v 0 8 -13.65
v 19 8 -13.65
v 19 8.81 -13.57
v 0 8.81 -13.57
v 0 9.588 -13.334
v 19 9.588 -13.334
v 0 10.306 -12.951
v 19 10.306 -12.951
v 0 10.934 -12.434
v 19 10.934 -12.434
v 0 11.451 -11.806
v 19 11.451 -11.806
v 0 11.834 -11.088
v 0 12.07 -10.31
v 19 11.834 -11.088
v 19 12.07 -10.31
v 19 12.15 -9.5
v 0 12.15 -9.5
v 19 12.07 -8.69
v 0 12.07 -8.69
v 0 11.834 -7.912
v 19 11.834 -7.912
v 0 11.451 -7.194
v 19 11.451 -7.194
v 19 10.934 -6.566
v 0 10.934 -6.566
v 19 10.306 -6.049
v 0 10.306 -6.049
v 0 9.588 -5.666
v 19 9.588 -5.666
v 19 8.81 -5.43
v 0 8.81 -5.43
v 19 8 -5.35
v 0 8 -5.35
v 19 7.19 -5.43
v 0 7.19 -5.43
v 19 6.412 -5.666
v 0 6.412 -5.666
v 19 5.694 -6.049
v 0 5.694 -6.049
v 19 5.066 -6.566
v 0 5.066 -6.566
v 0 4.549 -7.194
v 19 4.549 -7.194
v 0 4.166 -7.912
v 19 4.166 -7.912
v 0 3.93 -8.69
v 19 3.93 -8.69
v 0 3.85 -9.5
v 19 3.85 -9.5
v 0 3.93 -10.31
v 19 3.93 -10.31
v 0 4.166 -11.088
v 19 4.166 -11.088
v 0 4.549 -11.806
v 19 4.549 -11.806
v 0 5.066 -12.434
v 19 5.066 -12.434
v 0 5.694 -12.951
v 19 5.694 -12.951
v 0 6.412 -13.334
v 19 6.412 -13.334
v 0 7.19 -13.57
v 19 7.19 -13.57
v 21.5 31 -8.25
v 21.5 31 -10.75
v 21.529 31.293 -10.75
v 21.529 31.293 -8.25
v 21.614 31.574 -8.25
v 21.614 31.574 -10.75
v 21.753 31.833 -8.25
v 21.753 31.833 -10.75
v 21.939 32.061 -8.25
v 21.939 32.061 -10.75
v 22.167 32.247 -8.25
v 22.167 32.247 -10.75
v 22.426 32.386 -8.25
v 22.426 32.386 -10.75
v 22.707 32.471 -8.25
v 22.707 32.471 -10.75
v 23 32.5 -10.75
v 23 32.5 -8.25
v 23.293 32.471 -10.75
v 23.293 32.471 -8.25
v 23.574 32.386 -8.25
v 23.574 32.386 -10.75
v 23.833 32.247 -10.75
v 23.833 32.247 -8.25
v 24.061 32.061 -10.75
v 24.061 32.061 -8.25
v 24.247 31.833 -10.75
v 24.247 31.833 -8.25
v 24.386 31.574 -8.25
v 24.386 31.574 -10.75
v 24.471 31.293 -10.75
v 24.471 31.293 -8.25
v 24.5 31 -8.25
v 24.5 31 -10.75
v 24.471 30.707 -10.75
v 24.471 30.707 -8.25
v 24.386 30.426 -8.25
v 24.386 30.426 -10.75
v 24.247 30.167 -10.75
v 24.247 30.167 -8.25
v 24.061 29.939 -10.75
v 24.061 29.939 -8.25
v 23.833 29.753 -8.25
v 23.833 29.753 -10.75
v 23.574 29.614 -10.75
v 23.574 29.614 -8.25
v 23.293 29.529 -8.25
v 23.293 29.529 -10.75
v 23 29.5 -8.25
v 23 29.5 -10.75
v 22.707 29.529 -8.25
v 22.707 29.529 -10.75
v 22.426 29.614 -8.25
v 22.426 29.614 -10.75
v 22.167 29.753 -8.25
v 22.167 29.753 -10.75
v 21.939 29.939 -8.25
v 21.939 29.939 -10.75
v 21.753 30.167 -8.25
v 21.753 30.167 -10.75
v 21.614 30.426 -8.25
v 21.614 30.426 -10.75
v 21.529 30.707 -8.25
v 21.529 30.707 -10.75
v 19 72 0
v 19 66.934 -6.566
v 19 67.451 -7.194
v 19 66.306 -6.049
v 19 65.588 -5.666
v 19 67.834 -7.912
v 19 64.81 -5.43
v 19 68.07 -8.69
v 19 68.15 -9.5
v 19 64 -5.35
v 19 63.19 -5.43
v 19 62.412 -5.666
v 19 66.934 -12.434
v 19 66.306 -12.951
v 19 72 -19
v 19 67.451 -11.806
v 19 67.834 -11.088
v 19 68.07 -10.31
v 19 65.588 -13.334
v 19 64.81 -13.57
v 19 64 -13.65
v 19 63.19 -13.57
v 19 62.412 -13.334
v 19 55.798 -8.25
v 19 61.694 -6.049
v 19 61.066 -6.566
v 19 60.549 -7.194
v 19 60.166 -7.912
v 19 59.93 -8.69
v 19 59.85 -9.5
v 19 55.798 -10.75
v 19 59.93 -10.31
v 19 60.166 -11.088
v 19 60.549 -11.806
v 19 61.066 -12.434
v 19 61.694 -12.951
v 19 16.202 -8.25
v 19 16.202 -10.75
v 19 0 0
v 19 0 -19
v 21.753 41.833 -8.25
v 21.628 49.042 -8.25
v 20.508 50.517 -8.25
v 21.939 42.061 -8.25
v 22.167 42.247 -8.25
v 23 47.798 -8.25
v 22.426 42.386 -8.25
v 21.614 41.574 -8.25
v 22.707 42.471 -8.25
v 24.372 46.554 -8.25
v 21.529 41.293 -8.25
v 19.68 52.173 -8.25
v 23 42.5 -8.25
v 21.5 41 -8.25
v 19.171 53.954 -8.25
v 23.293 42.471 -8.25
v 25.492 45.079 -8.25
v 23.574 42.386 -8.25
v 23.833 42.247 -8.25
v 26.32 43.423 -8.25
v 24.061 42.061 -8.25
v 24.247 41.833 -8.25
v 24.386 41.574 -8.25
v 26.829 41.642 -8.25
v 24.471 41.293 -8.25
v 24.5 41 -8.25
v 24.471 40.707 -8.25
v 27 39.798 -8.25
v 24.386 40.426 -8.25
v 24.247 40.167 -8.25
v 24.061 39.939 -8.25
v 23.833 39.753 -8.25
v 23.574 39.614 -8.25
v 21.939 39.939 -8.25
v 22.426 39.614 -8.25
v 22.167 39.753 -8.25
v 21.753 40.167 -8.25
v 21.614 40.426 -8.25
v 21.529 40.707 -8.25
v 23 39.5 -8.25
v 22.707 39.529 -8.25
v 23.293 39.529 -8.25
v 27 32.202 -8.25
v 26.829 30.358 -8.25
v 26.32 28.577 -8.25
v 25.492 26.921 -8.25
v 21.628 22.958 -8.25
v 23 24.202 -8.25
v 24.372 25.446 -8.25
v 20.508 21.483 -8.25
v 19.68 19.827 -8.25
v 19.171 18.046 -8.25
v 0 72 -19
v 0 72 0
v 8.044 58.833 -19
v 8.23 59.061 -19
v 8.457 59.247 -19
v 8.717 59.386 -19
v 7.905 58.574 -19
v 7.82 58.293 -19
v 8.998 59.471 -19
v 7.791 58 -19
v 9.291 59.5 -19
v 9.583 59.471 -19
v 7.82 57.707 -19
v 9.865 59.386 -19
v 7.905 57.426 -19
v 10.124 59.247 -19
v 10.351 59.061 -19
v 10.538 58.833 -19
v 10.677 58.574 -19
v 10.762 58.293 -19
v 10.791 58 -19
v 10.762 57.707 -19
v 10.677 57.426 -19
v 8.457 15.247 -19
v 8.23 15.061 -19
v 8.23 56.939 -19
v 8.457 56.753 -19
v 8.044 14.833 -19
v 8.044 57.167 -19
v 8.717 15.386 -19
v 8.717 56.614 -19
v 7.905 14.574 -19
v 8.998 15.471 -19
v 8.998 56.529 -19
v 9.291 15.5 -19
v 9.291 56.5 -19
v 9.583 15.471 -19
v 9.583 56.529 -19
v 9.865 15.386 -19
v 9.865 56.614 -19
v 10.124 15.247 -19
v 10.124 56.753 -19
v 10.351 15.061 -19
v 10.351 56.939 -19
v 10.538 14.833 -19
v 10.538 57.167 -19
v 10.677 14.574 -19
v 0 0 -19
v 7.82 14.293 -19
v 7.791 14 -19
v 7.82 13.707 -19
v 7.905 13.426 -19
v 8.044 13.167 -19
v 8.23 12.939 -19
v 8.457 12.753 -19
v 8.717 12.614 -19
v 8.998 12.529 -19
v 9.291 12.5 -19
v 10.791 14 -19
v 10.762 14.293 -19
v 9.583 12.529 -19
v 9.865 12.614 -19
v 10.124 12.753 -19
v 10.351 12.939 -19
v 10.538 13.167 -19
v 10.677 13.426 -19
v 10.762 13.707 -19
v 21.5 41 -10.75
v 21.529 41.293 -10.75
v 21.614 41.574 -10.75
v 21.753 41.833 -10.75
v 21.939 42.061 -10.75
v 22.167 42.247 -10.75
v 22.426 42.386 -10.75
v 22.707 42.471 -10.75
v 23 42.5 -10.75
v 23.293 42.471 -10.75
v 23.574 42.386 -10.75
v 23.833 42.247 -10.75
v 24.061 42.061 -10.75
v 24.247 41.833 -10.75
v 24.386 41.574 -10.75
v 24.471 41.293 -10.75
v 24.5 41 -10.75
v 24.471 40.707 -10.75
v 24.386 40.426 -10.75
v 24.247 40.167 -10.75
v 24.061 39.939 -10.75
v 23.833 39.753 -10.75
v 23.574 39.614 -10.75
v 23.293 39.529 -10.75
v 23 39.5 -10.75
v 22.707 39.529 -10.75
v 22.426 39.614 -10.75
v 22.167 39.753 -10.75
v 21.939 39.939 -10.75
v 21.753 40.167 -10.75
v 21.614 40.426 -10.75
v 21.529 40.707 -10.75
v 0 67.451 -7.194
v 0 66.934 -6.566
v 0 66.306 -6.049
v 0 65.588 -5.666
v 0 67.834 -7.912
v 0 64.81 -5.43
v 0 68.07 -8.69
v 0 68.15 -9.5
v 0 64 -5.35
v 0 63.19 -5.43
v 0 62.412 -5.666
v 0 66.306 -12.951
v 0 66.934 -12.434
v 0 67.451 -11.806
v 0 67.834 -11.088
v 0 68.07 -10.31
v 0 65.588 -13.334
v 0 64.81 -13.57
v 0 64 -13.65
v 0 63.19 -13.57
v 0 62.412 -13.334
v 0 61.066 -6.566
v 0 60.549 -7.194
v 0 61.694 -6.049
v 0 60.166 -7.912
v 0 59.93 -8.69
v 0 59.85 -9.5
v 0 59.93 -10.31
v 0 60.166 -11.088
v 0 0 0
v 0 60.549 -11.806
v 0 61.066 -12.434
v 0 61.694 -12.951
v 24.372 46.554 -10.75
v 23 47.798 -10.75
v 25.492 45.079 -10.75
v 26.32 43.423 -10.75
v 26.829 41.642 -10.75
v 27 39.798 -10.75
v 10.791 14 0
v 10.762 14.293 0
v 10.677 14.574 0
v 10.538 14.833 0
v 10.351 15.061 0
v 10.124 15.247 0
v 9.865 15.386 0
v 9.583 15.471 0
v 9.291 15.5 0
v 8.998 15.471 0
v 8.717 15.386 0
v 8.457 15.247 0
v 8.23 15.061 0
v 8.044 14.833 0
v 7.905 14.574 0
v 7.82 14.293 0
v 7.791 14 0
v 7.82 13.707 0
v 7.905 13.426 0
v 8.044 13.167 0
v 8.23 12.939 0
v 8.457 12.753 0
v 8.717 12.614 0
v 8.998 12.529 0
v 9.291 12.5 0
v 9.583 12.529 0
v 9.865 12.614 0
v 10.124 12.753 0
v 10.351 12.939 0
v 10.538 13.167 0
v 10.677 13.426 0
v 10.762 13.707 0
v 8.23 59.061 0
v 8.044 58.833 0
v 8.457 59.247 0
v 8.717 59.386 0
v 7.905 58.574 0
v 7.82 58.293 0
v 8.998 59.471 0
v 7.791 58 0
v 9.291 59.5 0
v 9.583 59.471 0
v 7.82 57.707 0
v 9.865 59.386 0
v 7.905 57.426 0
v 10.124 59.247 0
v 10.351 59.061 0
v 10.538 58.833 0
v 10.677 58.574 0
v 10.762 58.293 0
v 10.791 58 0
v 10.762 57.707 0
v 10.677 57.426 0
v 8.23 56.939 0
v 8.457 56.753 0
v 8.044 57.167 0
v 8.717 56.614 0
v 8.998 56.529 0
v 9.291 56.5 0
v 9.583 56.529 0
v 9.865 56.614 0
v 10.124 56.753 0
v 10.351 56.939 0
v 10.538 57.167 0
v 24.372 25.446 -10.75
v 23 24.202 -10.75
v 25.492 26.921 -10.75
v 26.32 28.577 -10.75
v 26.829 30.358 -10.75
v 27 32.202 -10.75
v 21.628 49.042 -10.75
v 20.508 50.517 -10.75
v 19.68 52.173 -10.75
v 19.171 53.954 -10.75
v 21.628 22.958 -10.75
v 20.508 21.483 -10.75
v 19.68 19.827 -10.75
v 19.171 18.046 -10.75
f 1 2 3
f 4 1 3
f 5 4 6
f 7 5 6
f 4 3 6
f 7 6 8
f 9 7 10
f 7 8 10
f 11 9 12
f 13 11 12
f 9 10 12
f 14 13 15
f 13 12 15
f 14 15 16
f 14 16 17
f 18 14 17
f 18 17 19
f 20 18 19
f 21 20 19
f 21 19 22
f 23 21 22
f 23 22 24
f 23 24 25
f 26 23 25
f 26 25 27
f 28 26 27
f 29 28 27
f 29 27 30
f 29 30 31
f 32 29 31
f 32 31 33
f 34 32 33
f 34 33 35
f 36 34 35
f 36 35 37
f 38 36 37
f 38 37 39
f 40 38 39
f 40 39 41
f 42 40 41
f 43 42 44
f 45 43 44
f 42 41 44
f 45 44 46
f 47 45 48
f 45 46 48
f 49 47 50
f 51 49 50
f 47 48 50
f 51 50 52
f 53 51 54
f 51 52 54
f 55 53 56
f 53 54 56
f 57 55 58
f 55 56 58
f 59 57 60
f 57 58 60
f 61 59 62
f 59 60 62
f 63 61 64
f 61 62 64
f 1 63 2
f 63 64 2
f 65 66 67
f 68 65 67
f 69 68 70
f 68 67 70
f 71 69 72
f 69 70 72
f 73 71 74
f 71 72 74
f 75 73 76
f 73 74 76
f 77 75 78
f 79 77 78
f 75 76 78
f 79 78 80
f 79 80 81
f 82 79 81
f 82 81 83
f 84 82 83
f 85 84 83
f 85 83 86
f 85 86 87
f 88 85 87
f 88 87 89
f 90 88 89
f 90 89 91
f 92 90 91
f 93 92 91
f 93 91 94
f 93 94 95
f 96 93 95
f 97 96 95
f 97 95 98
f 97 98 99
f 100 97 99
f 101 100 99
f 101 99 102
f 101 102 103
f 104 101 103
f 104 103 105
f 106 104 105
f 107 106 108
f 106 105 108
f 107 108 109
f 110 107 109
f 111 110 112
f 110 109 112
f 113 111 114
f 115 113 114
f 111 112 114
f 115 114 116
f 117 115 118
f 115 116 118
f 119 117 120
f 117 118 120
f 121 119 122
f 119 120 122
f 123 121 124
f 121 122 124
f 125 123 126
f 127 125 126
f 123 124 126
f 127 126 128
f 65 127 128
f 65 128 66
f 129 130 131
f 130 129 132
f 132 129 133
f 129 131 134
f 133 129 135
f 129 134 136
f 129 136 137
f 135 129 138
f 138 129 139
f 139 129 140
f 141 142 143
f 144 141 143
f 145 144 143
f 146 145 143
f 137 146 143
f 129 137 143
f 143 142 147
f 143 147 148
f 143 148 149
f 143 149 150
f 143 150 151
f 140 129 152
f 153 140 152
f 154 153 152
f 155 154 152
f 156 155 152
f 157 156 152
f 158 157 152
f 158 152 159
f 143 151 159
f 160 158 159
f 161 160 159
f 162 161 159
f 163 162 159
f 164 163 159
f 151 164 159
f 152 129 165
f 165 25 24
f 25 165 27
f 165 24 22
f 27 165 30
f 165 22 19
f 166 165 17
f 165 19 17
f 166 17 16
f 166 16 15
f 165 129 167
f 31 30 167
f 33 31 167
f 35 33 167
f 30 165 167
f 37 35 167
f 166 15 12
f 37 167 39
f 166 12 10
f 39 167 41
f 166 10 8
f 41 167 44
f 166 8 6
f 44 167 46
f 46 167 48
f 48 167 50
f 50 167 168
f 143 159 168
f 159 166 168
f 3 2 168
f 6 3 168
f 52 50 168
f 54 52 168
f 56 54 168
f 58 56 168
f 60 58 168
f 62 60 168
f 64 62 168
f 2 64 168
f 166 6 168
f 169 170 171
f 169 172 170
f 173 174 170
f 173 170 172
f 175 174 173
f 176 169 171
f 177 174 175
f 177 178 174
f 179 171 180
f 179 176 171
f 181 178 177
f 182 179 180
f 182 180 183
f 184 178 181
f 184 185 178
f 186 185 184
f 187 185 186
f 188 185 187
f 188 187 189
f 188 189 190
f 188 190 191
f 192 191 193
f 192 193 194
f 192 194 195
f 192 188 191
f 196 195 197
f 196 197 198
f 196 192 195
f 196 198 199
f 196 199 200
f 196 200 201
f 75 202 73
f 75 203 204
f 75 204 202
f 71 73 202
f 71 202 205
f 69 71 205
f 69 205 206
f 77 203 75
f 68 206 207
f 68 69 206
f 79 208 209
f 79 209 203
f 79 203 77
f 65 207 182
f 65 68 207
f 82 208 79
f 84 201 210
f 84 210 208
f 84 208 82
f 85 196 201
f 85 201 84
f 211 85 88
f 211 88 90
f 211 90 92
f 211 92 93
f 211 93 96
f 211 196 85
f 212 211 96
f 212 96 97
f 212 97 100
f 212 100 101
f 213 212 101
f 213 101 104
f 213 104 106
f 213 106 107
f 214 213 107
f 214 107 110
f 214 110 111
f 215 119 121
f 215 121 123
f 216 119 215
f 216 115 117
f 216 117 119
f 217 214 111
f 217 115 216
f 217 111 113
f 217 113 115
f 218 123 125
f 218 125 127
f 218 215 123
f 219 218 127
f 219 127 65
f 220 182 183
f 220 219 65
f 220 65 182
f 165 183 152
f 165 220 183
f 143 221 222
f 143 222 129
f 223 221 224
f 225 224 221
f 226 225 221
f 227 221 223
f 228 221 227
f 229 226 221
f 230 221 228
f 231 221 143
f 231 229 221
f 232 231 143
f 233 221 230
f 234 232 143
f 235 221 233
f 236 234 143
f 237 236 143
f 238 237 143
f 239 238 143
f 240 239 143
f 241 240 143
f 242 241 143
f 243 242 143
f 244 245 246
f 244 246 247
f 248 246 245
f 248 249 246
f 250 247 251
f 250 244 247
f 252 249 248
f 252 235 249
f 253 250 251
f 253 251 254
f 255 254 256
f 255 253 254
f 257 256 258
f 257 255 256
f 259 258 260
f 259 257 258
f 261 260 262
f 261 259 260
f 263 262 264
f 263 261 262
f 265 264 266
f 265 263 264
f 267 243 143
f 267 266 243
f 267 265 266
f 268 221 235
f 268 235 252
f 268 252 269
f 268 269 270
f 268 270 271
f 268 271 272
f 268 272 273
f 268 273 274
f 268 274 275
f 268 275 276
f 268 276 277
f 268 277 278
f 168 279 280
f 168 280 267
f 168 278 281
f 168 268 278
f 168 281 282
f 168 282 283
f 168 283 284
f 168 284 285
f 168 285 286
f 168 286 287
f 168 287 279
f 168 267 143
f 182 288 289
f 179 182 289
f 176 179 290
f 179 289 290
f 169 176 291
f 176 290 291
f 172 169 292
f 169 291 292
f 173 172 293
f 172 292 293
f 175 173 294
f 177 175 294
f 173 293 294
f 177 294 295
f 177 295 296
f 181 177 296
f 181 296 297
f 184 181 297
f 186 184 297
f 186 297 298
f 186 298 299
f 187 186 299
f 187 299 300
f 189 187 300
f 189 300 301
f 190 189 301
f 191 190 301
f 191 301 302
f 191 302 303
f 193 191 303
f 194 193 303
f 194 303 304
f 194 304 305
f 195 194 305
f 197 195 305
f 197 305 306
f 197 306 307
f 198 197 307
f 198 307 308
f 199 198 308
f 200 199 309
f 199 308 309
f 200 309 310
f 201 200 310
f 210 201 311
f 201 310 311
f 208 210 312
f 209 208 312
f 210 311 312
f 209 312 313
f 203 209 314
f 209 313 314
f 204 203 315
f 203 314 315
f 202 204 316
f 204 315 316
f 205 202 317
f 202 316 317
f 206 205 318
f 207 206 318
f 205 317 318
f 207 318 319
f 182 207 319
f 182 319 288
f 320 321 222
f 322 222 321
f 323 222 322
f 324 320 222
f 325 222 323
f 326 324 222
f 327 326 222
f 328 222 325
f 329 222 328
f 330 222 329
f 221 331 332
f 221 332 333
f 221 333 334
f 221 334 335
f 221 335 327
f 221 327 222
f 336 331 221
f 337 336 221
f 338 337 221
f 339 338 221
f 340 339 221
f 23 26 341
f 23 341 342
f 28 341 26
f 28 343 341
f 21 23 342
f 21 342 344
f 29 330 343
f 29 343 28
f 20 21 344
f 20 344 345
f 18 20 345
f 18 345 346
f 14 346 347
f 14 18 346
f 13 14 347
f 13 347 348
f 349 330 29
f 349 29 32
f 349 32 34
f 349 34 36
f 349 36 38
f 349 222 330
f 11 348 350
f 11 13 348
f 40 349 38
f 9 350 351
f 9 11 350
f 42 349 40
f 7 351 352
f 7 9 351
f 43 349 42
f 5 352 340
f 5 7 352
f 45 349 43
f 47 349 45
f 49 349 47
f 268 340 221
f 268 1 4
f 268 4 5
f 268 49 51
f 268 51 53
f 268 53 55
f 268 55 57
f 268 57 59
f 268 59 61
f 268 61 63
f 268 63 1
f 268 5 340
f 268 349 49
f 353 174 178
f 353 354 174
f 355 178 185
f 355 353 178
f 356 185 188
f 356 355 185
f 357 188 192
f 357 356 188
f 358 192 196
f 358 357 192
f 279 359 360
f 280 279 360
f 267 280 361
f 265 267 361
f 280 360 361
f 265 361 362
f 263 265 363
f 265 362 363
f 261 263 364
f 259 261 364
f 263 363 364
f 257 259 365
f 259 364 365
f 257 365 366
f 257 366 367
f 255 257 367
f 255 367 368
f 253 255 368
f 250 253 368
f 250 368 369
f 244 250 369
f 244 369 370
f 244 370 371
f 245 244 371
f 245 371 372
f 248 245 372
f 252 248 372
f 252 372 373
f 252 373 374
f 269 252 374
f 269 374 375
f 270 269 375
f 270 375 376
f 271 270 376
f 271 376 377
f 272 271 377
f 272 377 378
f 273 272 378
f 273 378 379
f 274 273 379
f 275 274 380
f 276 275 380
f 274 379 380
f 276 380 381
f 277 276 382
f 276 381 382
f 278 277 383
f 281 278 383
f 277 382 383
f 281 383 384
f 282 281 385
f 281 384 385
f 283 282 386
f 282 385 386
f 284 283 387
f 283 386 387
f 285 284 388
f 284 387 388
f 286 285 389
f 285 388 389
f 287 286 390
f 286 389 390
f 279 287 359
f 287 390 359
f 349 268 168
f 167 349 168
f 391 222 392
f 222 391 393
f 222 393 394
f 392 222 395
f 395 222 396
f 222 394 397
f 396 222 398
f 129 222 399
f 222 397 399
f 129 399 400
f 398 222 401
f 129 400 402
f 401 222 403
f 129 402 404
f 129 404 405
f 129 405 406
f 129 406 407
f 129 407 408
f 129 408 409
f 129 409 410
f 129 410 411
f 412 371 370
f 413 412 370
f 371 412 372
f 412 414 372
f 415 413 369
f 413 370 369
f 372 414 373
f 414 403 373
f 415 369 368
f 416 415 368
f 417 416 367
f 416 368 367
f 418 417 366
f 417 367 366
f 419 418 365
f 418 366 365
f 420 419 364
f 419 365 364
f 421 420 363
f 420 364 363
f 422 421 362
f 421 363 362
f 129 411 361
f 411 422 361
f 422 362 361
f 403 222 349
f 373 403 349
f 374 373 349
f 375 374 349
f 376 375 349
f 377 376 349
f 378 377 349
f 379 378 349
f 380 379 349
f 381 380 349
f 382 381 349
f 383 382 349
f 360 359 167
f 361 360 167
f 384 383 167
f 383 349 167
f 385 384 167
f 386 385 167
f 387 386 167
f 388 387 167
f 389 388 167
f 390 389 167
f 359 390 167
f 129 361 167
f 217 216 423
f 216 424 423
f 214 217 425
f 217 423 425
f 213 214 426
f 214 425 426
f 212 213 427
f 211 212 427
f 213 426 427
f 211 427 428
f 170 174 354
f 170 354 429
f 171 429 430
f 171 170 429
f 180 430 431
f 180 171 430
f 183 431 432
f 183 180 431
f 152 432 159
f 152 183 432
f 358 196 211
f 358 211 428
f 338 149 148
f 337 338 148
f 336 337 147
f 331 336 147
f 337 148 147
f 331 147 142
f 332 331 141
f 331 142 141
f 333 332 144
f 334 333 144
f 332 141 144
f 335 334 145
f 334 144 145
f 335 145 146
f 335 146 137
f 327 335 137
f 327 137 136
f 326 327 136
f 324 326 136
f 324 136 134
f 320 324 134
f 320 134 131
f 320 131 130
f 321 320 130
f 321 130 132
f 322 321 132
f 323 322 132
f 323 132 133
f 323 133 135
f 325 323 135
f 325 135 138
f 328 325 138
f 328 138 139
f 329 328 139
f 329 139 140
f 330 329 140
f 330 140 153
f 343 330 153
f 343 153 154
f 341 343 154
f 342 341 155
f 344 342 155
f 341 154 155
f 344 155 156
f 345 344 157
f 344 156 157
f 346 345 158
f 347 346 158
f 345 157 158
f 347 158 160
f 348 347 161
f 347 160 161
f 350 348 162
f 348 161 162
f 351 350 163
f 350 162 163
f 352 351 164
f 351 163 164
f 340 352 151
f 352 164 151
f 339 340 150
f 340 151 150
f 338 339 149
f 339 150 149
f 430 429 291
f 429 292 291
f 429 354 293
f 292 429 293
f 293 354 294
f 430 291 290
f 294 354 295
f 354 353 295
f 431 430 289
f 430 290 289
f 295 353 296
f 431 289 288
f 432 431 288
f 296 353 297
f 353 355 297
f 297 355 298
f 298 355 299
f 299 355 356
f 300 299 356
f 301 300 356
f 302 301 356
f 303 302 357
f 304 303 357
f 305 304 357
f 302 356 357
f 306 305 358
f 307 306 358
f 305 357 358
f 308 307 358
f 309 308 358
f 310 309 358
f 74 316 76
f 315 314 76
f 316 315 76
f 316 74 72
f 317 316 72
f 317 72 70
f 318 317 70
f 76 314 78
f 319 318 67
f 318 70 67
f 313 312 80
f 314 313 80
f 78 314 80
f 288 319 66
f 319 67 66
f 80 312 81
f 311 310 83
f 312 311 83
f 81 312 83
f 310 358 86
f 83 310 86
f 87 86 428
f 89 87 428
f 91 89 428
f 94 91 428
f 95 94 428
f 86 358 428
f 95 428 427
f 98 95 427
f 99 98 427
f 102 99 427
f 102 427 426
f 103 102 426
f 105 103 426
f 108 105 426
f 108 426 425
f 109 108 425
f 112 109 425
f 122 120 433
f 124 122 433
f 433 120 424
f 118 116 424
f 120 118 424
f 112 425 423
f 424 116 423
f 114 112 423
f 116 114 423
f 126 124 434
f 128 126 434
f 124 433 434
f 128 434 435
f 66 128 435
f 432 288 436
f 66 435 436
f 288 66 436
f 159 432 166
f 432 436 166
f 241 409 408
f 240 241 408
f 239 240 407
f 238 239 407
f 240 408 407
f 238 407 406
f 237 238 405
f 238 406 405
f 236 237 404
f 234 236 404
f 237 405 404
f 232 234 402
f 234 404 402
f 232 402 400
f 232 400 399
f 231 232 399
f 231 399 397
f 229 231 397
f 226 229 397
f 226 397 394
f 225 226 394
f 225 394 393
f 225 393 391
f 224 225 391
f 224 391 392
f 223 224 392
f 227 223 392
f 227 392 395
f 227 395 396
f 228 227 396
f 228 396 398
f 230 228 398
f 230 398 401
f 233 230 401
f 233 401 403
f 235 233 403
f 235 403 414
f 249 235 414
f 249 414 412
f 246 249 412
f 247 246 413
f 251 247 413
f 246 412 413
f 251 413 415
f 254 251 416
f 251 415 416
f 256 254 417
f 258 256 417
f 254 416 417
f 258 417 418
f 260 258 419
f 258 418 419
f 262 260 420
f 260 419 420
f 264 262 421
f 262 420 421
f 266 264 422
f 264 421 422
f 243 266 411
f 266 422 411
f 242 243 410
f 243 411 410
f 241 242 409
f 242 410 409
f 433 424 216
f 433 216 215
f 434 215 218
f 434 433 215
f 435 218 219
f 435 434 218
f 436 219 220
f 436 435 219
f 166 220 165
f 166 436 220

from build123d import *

# Parameters (mm, degrees)
SKETCH1_W           = 19
SKETCH1_H           = 19
BOSS_EXTRUDE1_DEPTH = 72
SKETCH2_R           = 4.15
CUT_EXTRUDE1_DEPTH  = 77.850504227
SKETCH3_R           = 1.5
CUT_EXTRUDE2_DEPTH  = 77.850504227
SKETCH4_W           = 2.5
SKETCH4_H           = 20
BOSS_EXTRUDE2_DEPTH = 8
FILLET1_R           = 10
FILLET2_R           = 10
SKETCH5_R           = 1.5
CUT_EXTRUDE3_DEPTH  = 10


with BuildPart() as part:
    # Sketch1 → Boss-Extrude1 (new body)
    with BuildSketch(Plane(origin=(0, 0, 0), x_dir=(1, 0, 0), z_dir=(0, 1, 0))):
        with Locations((9.5, 9.5)):
            Rectangle(SKETCH1_W, SKETCH1_H)
    extrude(amount=BOSS_EXTRUDE1_DEPTH)

    # Sketch2 → Cut-Extrude1 (cut, through all)
    with BuildSketch(Plane(origin=(19, 0, 0), x_dir=(0, 0, -1), z_dir=(1, 0, 0))):
        with Locations((9.5, 64)):
            Circle(SKETCH2_R)
        with Locations((9.5, 8)):
            Circle(SKETCH2_R)
    extrude(amount=-CUT_EXTRUDE1_DEPTH, mode=Mode.SUBTRACT)

    # Sketch3 → Cut-Extrude2 (cut, through all)
    with BuildSketch(Plane.XY):
        with Locations((9.290763855, 58)):
            Circle(SKETCH3_R)
        with Locations((9.290763855, 14)):
            Circle(SKETCH3_R)
    extrude(amount=-CUT_EXTRUDE2_DEPTH, mode=Mode.SUBTRACT)

    # Sketch4 → Boss-Extrude2 (add)
    with BuildSketch(Plane(origin=(19, 0, 0), x_dir=(0, 0, -1), z_dir=(1, 0, 0))):
        with Locations((9.5, 36)):
            Rectangle(SKETCH4_W, SKETCH4_H)
    extrude(amount=BOSS_EXTRUDE2_DEPTH)

    # Fillet1
    # the kernel refuses this fillet: 10 mm, written as the material it adds along each edge
    with BuildSketch(Plane(origin=(19, 46, -8.25), x_dir=(0, 1, 0), z_dir=(0, 0, -1)), Plane(origin=(19, 26, -10.75), x_dir=(0, -1, 0), z_dir=(0, 0, 1))) as fillet1_piece_1:
        with BuildLine():
            CenterArc((9.797958971, 10), FILLET1_R, 191.536959033, 78.463040967)
            Line((0, 8), (-0.195959179, 7.96))
            ThreePointArc((-0.195959179, 7.96), (-0.2, 4), (-0.2, 0))
            Line((-0.2, 0), (0, -0.2))
            Line((0, -0.2), (9.797958971, -0.2))
            Line((9.797958971, -0.2), (9.797958971, 0))
        make_face()
    extrude(amount=2.5)

    # Fillet2
    fillet2_edges = [part.edges().sort_by_distance(p)[0] for p in [
        (27, 46, -9.5),
        (27, 26, -9.5),
    ]]
    fillet(fillet2_edges, radius=FILLET2_R)

    # Sketch5 → Cut-Extrude3 (cut)
    with BuildSketch(Plane(origin=(0, 0, -10.75), x_dir=(-1, 0, 0), z_dir=(0, 0, -1))):
        with Locations((-23, 41)):
            Circle(SKETCH5_R)
        with Locations((-23, 31)):
            Circle(SKETCH5_R)
    extrude(amount=-CUT_EXTRUDE3_DEPTH, mode=Mode.SUBTRACT)


solid = part.part
